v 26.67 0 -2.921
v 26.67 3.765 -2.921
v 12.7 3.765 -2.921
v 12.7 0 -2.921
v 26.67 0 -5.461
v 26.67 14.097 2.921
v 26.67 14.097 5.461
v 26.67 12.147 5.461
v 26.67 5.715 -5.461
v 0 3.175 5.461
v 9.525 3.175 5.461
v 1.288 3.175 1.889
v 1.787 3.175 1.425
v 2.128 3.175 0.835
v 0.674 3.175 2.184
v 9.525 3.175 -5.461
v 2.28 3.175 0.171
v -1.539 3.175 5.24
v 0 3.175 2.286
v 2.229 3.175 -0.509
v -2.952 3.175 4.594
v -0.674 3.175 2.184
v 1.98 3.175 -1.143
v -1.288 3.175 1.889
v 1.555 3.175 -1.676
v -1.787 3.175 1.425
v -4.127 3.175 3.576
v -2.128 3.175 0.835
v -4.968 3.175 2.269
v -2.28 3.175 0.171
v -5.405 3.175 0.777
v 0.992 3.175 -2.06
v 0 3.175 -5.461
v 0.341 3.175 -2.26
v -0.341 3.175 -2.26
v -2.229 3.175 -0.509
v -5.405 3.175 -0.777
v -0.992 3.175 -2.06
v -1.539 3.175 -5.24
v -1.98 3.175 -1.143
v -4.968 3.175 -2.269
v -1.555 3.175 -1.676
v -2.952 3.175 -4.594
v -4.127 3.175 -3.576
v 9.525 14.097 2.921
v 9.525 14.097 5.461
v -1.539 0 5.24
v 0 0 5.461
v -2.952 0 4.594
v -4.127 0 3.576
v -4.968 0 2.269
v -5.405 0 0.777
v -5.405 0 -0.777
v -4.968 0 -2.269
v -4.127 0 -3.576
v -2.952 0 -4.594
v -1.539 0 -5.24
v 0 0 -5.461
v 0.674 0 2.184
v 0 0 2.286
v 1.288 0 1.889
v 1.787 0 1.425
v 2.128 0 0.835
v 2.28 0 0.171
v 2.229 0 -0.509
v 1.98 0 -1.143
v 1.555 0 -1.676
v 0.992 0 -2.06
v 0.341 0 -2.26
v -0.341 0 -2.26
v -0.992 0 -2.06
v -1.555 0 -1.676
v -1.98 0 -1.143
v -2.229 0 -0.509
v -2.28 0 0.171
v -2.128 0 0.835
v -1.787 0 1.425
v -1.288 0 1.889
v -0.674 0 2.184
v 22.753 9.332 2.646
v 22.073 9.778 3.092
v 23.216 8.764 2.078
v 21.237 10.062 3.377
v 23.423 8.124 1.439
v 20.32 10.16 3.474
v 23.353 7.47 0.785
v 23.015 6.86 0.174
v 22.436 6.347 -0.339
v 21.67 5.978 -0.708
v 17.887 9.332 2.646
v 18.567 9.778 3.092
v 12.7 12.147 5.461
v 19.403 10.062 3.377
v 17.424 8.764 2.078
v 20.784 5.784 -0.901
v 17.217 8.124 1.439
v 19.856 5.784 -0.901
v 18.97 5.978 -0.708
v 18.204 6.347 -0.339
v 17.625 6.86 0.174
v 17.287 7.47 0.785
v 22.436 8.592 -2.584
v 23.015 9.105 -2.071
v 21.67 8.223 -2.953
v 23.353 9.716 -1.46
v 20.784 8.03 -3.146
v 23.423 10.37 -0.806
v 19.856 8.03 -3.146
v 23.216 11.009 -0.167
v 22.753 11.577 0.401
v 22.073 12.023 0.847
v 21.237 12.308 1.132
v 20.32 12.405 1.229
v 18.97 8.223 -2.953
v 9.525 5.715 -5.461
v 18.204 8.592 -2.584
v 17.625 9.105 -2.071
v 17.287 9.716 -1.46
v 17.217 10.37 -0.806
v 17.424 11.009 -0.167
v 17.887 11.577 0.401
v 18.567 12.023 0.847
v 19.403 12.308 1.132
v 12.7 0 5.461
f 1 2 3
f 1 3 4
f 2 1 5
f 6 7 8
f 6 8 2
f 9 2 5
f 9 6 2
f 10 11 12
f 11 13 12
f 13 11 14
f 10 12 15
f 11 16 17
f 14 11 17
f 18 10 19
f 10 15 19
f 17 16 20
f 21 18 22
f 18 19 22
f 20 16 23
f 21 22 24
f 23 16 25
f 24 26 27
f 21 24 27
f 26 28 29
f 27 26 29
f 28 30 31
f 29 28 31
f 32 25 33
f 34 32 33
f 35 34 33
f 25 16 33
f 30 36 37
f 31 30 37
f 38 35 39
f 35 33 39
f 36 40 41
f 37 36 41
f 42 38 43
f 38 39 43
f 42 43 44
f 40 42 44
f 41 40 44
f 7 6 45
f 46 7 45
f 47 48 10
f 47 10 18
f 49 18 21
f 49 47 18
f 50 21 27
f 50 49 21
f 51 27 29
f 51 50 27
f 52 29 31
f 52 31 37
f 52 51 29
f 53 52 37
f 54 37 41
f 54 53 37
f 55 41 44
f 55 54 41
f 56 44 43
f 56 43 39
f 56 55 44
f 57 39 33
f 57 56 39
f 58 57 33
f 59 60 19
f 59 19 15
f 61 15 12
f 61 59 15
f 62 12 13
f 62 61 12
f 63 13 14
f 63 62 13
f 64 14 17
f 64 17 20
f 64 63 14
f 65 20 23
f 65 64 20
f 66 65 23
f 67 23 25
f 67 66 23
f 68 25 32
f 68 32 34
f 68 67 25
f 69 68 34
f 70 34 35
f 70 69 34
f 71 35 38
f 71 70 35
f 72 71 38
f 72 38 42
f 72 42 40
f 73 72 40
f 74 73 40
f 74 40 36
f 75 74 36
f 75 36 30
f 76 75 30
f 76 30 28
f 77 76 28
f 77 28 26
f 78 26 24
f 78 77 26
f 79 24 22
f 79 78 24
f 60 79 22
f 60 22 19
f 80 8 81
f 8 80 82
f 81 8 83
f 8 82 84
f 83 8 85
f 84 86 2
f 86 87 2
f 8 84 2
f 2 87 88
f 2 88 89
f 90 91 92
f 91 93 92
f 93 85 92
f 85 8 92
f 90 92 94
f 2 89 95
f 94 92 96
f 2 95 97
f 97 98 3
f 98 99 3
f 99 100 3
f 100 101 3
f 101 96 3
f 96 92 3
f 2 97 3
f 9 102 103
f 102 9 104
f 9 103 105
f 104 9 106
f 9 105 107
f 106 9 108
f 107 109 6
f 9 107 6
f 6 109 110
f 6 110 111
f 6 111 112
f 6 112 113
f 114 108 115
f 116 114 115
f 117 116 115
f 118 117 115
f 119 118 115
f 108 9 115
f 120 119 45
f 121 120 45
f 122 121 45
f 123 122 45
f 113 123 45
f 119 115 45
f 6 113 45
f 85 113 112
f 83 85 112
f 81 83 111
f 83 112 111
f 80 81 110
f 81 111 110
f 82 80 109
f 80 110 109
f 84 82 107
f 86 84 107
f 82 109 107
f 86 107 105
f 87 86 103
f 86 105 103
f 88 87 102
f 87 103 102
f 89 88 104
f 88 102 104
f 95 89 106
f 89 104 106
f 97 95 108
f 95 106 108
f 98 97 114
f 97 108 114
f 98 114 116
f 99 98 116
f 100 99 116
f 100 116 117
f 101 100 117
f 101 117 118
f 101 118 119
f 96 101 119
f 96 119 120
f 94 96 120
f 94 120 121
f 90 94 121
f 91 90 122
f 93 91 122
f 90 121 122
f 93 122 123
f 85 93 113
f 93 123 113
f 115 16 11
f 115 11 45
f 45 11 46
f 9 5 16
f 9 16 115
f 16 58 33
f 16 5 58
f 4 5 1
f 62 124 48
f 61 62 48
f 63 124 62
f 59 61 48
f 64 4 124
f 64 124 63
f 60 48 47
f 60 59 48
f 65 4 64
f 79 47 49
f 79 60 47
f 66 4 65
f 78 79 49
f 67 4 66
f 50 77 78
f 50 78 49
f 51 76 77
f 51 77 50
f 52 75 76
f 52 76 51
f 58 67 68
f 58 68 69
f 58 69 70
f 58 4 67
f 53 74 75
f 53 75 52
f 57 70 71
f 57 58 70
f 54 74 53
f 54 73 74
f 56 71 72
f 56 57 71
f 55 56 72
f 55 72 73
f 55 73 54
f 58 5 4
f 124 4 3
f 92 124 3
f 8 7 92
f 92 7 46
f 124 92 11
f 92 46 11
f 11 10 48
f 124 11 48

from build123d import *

# Parameters (mm, degrees)
SKETCH1_R           = 2.286
BOSS_EXTRUDE1_DEPTH = 3.175
SKETCH5_W           = 3.175
SKETCH5_H           = 10.922
BOSS_EXTRUDE5_DEPTH = 2.54
BOSS_EXTRUDE6_START = 9.525
BOSS_EXTRUDE6_DEPTH = 3.175
BOSS_EXTRUDE7_DEPTH = 13.97
SKETCH10_R          = 3.1115
CUT_EXTRUDE1_DEPTH  = 3.175
CHAMFER1_SIZE       = 2.54
CHAMFER1_SIZE2      = 3.592102448


# Read off the part's stored shape, not the designer's step: Boss-Extrude6
with BuildPart() as part:
    # Sketch1 → Boss-Extrude1 (new body)
    with BuildSketch(Plane(origin=(0, 0, 0), x_dir=(1, 0, 0), z_dir=(0, 1, 0))):
        with BuildLine():
            Line((0, 5.461), (12.7, 5.461))
            Line((12.7, 5.461), (12.7, -5.461))
            Line((12.7, -5.461), (0, -5.461))
            ThreePointArc((0, -5.461), (-5.461, 0), (0, 5.461))
        make_face()
        with Locations(Location((0, 0, 0), (0, 0, 270))):
            Circle(SKETCH1_R, mode=Mode.SUBTRACT)
    extrude(amount=BOSS_EXTRUDE1_DEPTH)

    # Sketch5 → Boss-Extrude5 (add)
    with BuildSketch(Plane(origin=(0, 3.175, 0), x_dir=(1, 0, 0), z_dir=(0, 1, 0))):
        with Locations((11.1125, 0)):
            Rectangle(SKETCH5_W, SKETCH5_H)
    extrude(amount=BOSS_EXTRUDE5_DEPTH)

    # Boss-Extrude6 outline → Boss-Extrude6 (add)
    with BuildSketch(Plane.YZ.offset(BOSS_EXTRUDE6_START)):
        Polygon((16.637, 5.461), (5.715, 5.461), (5.715, -5.461), align=None)
    extrude(amount=BOSS_EXTRUDE6_DEPTH)

    # Sketch9 → Boss-Extrude7 (add)
    with BuildSketch(Plane(origin=(12.7, 0, 0), x_dir=(0, 0, -1), z_dir=(1, 0, 0))):
        Polygon((-5.461, 16.637), (-5.461, 12.146871939), (2.921, 3.764871939), (2.921, 0), (5.461, 0), (5.461, 1.224871939), (5.461, 5.715), align=None)
    extrude(amount=BOSS_EXTRUDE7_DEPTH)

    # Sketch10 → Cut-Extrude1 (cut)
    with BuildSketch(Plane(origin=(0, 5.588, -5.588), x_dir=(1, 0, 0), z_dir=(0, 0.7071067811865465, -0.7071067811865487))):
        with Locations(Location((20.32, -6.529605122, 0), (0, 0, 270))):
            Circle(SKETCH10_R)
    extrude(amount=-CUT_EXTRUDE1_DEPTH, mode=Mode.SUBTRACT)

    # Chamfer1
    chamfer1_edges = [part.edges().sort_by_distance(p)[0] for p in [
        (18.0975, 16.637, 5.461),
    ]]
    chamfer1_side = [part.faces().sort_by_distance(p)[0] for p in [
        (12.385662813, 6.07343597, 5.461),
    ]]
    chamfer(chamfer1_edges, length=CHAMFER1_SIZE, length2=CHAMFER1_SIZE2, reference=chamfer1_side[0])


solid = part.part
